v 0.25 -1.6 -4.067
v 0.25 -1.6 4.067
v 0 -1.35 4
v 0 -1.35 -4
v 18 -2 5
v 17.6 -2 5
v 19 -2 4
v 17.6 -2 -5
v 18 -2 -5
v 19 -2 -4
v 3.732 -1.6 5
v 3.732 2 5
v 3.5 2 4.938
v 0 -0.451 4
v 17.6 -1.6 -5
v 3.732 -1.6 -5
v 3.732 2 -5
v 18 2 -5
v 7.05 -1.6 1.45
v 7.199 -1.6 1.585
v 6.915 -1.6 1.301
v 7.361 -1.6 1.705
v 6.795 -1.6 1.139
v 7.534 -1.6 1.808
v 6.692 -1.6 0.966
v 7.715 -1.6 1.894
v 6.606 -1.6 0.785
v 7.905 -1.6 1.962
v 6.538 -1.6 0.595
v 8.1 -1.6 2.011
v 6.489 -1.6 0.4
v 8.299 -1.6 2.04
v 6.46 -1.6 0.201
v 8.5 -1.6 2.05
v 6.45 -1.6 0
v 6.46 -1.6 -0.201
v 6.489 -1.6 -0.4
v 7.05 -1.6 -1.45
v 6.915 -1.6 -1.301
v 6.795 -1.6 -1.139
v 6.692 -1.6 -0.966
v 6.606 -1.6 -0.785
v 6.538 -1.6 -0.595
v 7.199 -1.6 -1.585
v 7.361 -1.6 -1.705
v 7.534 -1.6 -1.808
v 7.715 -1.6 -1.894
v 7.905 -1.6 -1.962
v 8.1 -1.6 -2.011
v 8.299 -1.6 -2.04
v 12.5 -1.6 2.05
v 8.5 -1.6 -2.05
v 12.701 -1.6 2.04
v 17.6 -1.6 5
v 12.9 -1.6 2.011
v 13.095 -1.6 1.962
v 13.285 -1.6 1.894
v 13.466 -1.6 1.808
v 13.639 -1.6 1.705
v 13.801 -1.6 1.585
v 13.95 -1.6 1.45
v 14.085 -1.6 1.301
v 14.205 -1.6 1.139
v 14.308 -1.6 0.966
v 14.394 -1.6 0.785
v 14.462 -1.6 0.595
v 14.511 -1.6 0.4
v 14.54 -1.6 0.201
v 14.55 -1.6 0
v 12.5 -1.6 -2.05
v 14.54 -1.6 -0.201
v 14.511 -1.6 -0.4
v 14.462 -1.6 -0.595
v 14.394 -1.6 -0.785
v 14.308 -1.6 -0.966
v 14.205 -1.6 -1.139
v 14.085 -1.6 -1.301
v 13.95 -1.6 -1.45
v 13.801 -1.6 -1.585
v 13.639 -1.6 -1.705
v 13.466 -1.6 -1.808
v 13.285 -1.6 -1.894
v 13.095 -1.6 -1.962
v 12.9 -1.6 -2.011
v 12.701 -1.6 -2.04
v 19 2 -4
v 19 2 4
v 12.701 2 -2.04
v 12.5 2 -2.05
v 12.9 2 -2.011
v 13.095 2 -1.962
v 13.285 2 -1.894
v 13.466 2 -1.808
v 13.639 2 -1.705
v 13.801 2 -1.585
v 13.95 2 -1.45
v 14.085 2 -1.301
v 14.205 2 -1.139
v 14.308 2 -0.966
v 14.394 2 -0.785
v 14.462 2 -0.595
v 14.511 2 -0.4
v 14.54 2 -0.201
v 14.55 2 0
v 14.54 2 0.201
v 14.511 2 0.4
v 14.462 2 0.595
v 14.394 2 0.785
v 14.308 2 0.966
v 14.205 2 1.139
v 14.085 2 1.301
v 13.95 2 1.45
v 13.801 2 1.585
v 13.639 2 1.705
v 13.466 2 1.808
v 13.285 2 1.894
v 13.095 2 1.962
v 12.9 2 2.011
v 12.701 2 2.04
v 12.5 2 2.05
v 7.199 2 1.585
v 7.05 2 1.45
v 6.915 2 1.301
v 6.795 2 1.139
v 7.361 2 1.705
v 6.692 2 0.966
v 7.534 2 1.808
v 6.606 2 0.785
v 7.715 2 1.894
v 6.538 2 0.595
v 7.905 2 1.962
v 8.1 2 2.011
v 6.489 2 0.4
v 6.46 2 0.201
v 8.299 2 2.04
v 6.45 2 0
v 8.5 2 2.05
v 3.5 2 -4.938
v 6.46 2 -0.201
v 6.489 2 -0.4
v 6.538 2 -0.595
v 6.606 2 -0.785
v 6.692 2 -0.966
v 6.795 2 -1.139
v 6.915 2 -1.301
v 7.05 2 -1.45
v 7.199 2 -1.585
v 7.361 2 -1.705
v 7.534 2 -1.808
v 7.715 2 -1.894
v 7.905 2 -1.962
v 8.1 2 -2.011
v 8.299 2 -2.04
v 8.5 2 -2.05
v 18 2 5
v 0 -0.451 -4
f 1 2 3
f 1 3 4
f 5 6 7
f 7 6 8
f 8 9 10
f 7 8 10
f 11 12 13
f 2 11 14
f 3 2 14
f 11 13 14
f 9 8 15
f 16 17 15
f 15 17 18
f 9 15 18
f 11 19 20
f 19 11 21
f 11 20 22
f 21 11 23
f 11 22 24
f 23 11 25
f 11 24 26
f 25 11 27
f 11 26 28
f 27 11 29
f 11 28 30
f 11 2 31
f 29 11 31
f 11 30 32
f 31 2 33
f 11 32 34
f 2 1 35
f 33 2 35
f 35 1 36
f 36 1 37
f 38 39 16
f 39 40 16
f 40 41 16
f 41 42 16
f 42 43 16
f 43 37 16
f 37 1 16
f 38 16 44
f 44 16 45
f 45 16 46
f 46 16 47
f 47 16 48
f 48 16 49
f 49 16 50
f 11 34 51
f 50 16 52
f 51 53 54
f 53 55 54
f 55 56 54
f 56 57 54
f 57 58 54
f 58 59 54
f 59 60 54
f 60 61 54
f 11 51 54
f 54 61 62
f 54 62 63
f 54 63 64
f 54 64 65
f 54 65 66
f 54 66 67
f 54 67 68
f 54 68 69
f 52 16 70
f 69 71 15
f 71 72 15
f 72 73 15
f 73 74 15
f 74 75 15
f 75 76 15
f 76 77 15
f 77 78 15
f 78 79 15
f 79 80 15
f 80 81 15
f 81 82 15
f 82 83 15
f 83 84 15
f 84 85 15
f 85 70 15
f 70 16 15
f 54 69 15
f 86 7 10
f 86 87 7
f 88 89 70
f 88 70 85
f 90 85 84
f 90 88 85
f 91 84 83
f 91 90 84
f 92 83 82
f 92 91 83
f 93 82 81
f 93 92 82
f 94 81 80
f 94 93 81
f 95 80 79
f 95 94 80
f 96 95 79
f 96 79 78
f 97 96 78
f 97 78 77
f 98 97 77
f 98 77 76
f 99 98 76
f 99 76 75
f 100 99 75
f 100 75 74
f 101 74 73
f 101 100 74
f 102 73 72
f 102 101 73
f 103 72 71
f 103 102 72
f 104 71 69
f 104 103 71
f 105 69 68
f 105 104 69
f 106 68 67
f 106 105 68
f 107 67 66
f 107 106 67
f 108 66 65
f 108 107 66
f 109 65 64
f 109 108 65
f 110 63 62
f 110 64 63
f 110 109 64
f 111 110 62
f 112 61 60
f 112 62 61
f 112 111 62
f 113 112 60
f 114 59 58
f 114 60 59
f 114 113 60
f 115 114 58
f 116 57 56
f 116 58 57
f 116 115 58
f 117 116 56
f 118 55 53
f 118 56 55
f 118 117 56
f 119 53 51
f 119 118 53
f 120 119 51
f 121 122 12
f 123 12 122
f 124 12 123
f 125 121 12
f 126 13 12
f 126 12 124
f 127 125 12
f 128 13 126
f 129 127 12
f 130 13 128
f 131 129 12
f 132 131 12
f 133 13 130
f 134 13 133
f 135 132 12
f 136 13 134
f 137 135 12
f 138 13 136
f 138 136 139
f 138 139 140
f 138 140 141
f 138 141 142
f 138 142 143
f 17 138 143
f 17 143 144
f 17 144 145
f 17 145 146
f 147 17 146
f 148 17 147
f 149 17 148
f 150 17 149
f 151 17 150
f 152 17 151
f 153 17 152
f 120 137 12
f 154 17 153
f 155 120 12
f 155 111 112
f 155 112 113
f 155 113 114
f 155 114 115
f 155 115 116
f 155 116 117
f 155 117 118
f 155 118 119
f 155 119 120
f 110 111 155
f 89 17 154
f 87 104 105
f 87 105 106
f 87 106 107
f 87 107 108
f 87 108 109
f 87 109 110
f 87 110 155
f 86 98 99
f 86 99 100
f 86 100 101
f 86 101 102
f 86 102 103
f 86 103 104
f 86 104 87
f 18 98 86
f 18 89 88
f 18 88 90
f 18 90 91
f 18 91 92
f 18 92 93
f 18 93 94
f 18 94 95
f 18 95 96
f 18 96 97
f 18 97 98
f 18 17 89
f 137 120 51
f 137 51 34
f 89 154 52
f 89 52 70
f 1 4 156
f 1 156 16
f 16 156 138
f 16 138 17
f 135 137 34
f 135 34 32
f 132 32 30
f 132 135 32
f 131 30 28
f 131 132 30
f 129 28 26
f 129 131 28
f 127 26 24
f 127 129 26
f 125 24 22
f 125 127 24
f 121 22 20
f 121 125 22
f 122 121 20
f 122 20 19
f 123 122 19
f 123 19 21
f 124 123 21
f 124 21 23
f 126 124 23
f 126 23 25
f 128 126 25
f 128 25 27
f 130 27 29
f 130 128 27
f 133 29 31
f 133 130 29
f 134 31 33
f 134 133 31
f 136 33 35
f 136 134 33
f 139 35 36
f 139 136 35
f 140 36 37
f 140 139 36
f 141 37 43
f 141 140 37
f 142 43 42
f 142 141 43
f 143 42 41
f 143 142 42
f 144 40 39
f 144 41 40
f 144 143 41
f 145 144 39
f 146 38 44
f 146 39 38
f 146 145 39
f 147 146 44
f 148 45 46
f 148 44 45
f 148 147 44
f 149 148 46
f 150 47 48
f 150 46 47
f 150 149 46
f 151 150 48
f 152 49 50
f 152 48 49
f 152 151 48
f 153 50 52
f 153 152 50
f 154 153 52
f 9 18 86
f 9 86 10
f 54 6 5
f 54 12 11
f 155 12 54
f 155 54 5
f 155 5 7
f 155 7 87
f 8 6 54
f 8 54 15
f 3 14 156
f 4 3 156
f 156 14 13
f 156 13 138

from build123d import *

# Parameters (mm, degrees)
SKETCH1_W           = 19
SKETCH1_H           = 10
BOSS_EXTRUDE1_DEPTH = 2
CHAMFER2_SIZE       = 1
SKETCH2_W           = 17.6
SKETCH2_H           = 10
CUT_EXTRUDE4_DEPTH  = 0.4
CUT_EXTRUDE5_DEPTH  = 21.049937656
CHAMFER4_SIZE       = 3.5
CHAMFER4_SIZE2      = 2.450726384
CHAMFER5_SIZE       = 0.25


with BuildPart() as part:
    # Sketch1 → Boss-Extrude1 (new, symmetric)
    with BuildSketch(Plane(origin=(0, 0, 0), x_dir=(1, 0, 0), z_dir=(0, 1, 0))):
        with Locations((9.5, 0)):
            Rectangle(SKETCH1_W, SKETCH1_H)
        with BuildLine():
            Line((8.5, 2.05), (12.5, 2.05))
            ThreePointArc((12.5, 2.05), (14.55, 0), (12.5, -2.05))
            Line((12.5, -2.05), (8.5, -2.05))
            ThreePointArc((8.5, -2.05), (6.45, 0), (8.5, 2.05))
        make_face(mode=Mode.SUBTRACT)
    extrude(amount=BOSS_EXTRUDE1_DEPTH, both=True)

    # Chamfer2
    chamfer2_edges = [part.edges().sort_by_distance(p)[0] for p in [
        (19, 0, -5),
        (19, 0, 5),
    ]]
    chamfer(chamfer2_edges, length=CHAMFER2_SIZE)

    # Sketch2 → Cut-Extrude4 (cut)
    with BuildSketch(Plane(origin=(0, -2, 0), x_dir=(1, 0, 0), z_dir=(0, 1, 0))):
        with Locations((8.8, 0)):
            Rectangle(SKETCH2_W, SKETCH2_H)
    extrude(amount=CUT_EXTRUDE4_DEPTH, mode=Mode.SUBTRACT)

    # Sketch5 → Cut-Extrude5 (cut, through all)
    with BuildSketch(Plane(origin=(0, 2, 0), x_dir=(1, 0, 0), z_dir=(0, 1, 0))):
        Polygon((0, 4), (3.732050808, 5), (0, 5), align=None)
        Polygon((0, -4), (0, -5), (3.732050808, -5), align=None)
    extrude(amount=-CUT_EXTRUDE5_DEPTH, mode=Mode.SUBTRACT)

    # Chamfer4
    chamfer4_edges = [part.edges().sort_by_distance(p)[0] for p in [
        (0, 2, 0),
    ]]
    chamfer4_side = [part.faces().sort_by_distance(p)[0] for p in [
        (1.921596209, 2, -4.29260693),
    ]]
    chamfer(chamfer4_edges, length=CHAMFER4_SIZE, length2=CHAMFER4_SIZE2, reference=chamfer4_side[0])

    # Chamfer5
    chamfer5_edges = [part.edges().sort_by_distance(p)[0] for p in [
        (0, -1.6, 0),
    ]]
    chamfer(chamfer5_edges, length=CHAMFER5_SIZE)


solid = part.part
